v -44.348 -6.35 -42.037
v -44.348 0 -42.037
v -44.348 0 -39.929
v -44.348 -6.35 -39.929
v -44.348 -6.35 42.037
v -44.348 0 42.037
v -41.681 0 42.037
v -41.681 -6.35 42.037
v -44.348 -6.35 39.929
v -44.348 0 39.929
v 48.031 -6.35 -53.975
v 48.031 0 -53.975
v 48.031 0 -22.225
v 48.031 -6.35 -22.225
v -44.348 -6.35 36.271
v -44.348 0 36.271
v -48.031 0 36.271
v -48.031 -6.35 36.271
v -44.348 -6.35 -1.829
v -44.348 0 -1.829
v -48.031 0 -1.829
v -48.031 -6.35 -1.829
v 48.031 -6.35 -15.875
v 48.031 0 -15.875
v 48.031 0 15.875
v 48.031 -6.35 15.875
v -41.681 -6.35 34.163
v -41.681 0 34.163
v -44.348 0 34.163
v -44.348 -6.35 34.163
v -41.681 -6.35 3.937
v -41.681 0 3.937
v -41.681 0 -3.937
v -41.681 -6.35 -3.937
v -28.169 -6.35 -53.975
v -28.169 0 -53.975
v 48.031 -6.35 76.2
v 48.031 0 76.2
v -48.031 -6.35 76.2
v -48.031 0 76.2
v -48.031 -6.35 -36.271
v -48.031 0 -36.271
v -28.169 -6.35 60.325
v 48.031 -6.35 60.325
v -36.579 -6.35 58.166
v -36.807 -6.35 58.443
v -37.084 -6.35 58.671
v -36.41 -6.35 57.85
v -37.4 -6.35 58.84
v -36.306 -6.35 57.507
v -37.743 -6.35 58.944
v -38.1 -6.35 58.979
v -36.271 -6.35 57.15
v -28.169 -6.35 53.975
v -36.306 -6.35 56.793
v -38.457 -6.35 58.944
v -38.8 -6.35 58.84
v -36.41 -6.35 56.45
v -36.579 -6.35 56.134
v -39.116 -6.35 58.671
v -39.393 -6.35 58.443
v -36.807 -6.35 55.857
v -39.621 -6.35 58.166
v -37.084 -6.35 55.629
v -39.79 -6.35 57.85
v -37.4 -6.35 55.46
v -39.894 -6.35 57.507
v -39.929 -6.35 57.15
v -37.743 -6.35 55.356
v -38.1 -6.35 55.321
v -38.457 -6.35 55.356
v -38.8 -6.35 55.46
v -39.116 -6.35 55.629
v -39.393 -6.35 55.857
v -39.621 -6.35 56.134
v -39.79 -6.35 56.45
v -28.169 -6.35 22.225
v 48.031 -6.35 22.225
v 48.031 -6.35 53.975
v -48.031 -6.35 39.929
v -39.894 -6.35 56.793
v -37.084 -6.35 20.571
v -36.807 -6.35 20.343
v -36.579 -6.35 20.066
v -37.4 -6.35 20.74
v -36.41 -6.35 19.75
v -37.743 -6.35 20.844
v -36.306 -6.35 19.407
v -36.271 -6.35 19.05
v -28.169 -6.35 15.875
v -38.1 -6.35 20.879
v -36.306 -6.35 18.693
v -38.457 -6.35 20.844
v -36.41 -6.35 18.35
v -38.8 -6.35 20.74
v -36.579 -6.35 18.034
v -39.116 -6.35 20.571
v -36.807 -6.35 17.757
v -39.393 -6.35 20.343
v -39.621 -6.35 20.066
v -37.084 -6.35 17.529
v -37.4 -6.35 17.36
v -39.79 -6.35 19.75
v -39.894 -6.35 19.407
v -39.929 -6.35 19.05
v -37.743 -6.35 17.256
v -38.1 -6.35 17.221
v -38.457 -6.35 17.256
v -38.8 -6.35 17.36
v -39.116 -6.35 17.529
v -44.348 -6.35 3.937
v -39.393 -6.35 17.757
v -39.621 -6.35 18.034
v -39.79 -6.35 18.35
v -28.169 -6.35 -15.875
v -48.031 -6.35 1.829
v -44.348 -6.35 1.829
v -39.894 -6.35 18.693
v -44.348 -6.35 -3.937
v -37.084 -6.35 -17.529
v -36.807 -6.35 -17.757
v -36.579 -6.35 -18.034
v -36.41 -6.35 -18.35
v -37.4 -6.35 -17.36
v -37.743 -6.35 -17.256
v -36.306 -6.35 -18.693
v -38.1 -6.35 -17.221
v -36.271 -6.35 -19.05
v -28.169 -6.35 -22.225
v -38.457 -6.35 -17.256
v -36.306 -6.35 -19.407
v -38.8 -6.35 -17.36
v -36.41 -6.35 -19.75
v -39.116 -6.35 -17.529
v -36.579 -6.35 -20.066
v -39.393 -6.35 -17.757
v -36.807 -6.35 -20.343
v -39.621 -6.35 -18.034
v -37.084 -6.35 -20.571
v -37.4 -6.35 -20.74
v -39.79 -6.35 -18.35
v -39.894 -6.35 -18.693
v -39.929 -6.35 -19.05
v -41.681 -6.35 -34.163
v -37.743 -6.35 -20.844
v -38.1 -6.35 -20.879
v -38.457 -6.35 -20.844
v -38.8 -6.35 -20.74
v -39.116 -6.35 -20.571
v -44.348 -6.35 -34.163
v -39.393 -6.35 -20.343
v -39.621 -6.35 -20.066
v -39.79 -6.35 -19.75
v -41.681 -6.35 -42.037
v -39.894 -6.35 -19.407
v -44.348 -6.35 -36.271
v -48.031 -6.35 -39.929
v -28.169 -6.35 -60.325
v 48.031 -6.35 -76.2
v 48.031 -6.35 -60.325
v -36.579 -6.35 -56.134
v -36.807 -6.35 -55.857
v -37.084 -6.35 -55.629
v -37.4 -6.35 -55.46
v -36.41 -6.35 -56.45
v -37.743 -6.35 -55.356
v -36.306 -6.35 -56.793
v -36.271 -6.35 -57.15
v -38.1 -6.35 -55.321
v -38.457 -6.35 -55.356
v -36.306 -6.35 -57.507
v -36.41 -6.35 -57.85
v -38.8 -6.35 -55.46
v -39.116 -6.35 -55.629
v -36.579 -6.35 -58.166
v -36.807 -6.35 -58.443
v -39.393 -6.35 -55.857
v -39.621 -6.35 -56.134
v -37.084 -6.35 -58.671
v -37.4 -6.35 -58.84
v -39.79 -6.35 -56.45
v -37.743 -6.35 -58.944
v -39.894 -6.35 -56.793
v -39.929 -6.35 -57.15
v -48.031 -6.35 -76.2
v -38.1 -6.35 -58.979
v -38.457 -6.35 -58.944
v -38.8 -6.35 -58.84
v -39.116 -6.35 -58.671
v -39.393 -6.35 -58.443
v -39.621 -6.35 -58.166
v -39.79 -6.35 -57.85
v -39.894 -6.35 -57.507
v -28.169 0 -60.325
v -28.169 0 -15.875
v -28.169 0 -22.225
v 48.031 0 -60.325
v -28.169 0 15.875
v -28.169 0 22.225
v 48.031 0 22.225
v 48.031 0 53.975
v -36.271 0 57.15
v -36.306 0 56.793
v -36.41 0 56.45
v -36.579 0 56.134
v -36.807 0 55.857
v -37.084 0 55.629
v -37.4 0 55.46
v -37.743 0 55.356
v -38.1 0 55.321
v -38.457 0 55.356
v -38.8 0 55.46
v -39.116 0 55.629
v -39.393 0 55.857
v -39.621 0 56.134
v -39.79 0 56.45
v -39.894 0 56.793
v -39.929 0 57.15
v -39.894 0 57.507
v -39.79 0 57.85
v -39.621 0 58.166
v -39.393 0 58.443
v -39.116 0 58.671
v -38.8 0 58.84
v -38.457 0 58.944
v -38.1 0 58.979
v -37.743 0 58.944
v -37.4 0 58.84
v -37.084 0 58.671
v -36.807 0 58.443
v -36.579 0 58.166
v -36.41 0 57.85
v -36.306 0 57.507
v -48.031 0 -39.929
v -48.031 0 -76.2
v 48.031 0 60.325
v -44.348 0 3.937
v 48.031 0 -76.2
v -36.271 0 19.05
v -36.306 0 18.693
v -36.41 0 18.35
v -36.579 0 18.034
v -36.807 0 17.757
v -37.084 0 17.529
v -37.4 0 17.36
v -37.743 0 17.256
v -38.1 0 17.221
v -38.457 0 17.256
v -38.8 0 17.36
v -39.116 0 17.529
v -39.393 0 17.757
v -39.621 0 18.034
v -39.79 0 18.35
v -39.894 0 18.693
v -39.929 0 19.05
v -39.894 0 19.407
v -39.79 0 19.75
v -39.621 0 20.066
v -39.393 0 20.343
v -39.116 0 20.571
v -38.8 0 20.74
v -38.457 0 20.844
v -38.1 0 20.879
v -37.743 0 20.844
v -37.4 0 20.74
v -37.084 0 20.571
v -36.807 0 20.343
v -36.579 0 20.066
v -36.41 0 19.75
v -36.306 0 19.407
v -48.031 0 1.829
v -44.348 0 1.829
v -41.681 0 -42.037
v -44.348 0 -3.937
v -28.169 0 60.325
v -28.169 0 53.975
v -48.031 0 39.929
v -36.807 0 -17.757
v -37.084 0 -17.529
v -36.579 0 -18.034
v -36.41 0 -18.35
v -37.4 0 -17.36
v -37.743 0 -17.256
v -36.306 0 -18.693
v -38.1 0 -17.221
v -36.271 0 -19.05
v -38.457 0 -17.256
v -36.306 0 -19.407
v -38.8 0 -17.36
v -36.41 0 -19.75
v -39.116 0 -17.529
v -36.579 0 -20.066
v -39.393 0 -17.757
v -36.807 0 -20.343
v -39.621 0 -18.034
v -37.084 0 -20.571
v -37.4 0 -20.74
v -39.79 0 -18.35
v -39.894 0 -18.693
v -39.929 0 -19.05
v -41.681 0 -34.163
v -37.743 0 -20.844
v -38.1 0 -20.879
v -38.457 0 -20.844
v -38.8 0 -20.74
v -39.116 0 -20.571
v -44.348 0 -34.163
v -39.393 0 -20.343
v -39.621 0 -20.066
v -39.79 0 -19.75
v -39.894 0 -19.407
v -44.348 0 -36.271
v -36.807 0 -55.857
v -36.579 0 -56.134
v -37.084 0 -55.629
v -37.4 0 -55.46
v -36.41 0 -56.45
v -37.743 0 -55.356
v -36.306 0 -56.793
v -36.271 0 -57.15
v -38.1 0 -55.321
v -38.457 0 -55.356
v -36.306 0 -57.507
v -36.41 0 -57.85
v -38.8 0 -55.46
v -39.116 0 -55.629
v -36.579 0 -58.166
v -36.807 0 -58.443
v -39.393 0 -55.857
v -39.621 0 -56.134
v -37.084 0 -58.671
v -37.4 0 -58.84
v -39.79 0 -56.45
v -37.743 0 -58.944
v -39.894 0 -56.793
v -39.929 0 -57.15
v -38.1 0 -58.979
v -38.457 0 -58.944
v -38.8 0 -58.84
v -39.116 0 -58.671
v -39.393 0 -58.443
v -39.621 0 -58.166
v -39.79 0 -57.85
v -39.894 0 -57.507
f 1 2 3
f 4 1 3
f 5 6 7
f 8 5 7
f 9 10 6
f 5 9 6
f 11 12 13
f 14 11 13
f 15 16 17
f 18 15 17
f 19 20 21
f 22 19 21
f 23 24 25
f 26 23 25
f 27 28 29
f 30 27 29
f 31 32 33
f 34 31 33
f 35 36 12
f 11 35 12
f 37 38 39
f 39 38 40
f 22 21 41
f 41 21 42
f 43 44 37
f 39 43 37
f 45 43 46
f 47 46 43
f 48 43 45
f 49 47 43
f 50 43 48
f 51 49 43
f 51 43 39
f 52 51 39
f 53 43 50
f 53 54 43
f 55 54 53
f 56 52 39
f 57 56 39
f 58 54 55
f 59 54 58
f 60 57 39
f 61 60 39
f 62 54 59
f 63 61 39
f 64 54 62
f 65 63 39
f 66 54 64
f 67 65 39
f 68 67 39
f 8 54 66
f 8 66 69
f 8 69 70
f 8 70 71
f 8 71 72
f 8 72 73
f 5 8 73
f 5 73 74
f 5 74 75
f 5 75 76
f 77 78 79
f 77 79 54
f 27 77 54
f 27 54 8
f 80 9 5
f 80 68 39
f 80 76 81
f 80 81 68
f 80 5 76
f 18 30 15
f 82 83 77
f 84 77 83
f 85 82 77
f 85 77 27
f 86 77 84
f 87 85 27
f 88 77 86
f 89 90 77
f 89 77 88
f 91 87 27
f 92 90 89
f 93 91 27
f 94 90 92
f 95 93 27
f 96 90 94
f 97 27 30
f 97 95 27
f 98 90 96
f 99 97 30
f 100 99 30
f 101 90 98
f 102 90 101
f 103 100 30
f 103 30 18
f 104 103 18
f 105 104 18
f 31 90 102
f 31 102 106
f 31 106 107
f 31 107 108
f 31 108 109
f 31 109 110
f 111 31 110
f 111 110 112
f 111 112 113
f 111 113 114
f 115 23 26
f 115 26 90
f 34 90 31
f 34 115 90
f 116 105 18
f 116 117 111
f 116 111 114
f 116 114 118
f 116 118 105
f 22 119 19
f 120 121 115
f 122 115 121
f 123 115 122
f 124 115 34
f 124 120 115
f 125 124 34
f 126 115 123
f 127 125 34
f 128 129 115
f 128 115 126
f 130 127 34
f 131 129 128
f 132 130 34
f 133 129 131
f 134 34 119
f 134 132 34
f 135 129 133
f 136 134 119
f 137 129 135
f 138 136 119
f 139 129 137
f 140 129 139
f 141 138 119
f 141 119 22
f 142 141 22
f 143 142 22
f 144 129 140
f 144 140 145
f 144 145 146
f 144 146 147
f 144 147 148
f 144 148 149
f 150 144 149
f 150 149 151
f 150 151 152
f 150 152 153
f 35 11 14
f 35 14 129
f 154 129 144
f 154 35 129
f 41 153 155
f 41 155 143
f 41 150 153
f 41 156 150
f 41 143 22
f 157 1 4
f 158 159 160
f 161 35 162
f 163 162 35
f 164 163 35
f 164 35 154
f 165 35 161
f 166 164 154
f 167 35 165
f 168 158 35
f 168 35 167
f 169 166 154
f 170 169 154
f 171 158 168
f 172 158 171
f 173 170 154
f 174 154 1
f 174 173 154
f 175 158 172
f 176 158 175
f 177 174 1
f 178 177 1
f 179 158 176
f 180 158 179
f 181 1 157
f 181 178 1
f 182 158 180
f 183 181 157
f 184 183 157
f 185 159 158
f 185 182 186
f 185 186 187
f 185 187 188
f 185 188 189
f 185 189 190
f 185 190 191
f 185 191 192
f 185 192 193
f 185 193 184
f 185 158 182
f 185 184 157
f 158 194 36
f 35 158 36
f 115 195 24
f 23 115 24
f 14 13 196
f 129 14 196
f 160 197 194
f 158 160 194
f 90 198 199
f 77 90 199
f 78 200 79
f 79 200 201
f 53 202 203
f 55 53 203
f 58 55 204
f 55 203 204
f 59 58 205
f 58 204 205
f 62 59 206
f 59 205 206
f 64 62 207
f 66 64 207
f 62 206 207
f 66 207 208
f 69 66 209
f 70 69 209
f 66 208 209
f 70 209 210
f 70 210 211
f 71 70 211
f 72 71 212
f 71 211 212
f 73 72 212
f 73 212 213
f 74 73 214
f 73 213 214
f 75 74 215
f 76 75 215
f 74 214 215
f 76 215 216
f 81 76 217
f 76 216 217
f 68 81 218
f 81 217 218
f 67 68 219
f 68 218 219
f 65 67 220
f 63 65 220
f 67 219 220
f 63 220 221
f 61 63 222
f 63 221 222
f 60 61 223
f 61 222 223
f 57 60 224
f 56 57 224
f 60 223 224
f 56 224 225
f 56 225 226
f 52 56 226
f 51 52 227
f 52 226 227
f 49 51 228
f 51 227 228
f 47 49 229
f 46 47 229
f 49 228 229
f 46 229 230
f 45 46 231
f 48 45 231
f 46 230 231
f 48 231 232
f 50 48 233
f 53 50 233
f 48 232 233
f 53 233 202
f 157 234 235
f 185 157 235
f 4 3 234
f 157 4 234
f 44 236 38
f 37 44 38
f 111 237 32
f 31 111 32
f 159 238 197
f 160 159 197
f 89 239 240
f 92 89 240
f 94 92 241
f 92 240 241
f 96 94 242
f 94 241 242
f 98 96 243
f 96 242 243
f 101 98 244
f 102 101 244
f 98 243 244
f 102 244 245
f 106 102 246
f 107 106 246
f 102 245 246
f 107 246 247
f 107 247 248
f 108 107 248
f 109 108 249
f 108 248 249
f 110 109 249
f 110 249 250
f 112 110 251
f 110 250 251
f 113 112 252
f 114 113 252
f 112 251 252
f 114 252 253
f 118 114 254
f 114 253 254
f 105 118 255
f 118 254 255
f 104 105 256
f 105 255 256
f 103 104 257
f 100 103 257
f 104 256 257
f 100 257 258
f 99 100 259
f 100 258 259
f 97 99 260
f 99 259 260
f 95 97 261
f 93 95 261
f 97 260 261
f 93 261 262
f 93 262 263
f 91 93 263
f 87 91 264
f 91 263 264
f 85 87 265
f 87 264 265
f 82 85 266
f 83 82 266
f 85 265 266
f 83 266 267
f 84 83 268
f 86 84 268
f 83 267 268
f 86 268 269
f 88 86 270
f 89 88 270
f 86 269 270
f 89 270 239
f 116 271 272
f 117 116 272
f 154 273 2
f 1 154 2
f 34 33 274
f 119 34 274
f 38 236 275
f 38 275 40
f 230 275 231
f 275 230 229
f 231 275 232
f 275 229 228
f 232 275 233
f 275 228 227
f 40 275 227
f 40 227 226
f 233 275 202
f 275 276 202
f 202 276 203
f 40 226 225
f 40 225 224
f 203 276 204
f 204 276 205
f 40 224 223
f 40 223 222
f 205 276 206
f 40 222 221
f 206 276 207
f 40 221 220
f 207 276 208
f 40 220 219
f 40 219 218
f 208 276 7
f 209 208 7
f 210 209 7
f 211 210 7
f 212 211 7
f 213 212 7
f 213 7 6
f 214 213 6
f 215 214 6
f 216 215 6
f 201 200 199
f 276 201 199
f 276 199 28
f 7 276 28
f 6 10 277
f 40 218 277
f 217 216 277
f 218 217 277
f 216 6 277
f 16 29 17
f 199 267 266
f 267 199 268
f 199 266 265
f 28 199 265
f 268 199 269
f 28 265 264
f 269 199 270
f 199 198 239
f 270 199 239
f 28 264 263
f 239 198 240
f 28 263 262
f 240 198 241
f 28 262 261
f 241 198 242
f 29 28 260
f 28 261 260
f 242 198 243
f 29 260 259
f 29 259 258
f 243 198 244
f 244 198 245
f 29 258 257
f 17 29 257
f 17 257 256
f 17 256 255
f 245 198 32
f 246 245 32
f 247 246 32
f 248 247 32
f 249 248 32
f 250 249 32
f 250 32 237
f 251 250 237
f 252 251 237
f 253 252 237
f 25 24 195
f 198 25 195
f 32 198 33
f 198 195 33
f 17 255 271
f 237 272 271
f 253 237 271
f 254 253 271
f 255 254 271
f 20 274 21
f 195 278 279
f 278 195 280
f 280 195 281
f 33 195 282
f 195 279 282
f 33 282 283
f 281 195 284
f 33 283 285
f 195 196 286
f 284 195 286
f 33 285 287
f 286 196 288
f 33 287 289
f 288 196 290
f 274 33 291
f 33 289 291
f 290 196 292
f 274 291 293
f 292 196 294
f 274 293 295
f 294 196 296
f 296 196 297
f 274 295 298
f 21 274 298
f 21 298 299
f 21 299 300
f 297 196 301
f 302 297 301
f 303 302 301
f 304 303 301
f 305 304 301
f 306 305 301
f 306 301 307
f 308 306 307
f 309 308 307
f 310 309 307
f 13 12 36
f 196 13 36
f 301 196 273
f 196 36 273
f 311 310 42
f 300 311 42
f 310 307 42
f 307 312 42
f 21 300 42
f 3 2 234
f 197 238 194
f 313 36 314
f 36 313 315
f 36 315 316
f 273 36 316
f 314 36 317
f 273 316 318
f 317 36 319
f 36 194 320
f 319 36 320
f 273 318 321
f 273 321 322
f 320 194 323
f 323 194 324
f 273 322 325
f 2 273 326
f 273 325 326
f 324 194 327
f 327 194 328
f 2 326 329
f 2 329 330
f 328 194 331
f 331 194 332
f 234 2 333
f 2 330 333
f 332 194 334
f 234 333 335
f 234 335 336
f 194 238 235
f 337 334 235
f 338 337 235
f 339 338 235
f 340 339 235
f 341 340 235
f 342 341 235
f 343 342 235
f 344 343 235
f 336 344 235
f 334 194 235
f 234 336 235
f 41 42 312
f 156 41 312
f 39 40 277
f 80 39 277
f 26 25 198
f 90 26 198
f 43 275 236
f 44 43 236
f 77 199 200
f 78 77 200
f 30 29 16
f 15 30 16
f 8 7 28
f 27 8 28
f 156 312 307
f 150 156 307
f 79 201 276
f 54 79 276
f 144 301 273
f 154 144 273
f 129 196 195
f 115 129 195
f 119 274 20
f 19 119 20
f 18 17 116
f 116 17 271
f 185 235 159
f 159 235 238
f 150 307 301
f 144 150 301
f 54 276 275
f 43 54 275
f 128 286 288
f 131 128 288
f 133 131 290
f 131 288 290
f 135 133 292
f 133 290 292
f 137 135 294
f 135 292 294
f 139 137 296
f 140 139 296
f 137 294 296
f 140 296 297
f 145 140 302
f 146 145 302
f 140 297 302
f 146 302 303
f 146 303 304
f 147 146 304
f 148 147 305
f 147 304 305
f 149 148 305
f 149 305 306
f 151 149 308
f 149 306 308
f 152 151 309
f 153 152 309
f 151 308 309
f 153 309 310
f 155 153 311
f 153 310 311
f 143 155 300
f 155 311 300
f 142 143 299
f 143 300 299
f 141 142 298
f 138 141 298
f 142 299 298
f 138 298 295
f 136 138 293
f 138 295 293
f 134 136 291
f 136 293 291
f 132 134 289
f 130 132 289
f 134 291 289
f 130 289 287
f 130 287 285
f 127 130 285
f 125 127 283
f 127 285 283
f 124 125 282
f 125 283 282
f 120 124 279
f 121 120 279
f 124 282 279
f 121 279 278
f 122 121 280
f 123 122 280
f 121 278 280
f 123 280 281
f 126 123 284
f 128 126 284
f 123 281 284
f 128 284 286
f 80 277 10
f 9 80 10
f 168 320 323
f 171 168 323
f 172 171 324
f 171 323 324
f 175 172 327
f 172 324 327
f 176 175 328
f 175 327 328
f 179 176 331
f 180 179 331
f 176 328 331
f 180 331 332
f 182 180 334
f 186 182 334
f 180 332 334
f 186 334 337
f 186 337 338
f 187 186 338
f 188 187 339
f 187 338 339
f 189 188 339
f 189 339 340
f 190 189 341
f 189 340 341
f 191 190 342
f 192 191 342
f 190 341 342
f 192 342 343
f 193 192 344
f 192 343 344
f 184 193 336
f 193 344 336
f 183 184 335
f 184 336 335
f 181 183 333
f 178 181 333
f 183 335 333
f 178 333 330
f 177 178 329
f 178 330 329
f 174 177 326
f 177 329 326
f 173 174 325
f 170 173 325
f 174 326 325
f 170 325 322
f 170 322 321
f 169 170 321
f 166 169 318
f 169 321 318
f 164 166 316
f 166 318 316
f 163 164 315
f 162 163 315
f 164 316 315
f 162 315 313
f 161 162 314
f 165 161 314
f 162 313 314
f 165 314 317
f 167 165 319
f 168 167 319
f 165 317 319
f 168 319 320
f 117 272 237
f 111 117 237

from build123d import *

# Parameters (mm, degrees)
SKETCH1_R           = 1.8288
BOSS_EXTRUDE1_DEPTH = 6.35


with BuildPart() as part:
    # Sketch1 → Boss-Extrude1 (new body)
    with BuildSketch(Plane(origin=(0, 0, 0), x_dir=(1, 0, 0), z_dir=(0, 1, 0))):
        Polygon((-48.0314, 76.2), (48.0314, 76.2), (48.0314, 60.325), (-28.1686, 60.325), (-28.1686, 53.975), (48.0314, 53.975), (48.0314, 22.225), (-28.1686, 22.225), (-28.1686, 15.875), (48.0314, 15.875), (48.0314, -15.875), (-28.1686, -15.875), (-28.1686, -22.225), (48.0314, -22.225), (48.0314, -53.975), (-28.1686, -53.975), (-28.1686, -60.325), (48.0314, -60.325), (48.0314, -76.2), (-48.0314, -76.2), (-48.0314, -39.9288), (-44.3484, -39.9288), (-44.3484, -42.037), (-41.6814, -42.037), (-41.6814, -34.163), (-44.3484, -34.163), (-44.3484, -36.2712), (-48.0314, -36.2712), (-48.0314, -1.8288), (-44.3484, -1.8288), (-44.3484, -3.937), (-41.6814, -3.937), (-41.6814, 3.937), (-44.3484, 3.937), (-44.3484, 1.8288), (-48.0314, 1.8288), (-48.0314, 36.2712), (-44.3484, 36.2712), (-44.3484, 34.163), (-41.6814, 34.163), (-41.6814, 42.037), (-44.3484, 42.037), (-44.3484, 39.9288), (-48.0314, 39.9288), align=None)
        with Locations((-38.1, 57.15)):
            Circle(SKETCH1_R, mode=Mode.SUBTRACT)
        with Locations((-38.1, 19.05)):
            Circle(SKETCH1_R, mode=Mode.SUBTRACT)
        with Locations((-38.1, -19.05)):
            Circle(SKETCH1_R, mode=Mode.SUBTRACT)
        with Locations((-38.1, -57.15)):
            Circle(SKETCH1_R, mode=Mode.SUBTRACT)
    extrude(amount=-BOSS_EXTRUDE1_DEPTH)


solid = part.part
